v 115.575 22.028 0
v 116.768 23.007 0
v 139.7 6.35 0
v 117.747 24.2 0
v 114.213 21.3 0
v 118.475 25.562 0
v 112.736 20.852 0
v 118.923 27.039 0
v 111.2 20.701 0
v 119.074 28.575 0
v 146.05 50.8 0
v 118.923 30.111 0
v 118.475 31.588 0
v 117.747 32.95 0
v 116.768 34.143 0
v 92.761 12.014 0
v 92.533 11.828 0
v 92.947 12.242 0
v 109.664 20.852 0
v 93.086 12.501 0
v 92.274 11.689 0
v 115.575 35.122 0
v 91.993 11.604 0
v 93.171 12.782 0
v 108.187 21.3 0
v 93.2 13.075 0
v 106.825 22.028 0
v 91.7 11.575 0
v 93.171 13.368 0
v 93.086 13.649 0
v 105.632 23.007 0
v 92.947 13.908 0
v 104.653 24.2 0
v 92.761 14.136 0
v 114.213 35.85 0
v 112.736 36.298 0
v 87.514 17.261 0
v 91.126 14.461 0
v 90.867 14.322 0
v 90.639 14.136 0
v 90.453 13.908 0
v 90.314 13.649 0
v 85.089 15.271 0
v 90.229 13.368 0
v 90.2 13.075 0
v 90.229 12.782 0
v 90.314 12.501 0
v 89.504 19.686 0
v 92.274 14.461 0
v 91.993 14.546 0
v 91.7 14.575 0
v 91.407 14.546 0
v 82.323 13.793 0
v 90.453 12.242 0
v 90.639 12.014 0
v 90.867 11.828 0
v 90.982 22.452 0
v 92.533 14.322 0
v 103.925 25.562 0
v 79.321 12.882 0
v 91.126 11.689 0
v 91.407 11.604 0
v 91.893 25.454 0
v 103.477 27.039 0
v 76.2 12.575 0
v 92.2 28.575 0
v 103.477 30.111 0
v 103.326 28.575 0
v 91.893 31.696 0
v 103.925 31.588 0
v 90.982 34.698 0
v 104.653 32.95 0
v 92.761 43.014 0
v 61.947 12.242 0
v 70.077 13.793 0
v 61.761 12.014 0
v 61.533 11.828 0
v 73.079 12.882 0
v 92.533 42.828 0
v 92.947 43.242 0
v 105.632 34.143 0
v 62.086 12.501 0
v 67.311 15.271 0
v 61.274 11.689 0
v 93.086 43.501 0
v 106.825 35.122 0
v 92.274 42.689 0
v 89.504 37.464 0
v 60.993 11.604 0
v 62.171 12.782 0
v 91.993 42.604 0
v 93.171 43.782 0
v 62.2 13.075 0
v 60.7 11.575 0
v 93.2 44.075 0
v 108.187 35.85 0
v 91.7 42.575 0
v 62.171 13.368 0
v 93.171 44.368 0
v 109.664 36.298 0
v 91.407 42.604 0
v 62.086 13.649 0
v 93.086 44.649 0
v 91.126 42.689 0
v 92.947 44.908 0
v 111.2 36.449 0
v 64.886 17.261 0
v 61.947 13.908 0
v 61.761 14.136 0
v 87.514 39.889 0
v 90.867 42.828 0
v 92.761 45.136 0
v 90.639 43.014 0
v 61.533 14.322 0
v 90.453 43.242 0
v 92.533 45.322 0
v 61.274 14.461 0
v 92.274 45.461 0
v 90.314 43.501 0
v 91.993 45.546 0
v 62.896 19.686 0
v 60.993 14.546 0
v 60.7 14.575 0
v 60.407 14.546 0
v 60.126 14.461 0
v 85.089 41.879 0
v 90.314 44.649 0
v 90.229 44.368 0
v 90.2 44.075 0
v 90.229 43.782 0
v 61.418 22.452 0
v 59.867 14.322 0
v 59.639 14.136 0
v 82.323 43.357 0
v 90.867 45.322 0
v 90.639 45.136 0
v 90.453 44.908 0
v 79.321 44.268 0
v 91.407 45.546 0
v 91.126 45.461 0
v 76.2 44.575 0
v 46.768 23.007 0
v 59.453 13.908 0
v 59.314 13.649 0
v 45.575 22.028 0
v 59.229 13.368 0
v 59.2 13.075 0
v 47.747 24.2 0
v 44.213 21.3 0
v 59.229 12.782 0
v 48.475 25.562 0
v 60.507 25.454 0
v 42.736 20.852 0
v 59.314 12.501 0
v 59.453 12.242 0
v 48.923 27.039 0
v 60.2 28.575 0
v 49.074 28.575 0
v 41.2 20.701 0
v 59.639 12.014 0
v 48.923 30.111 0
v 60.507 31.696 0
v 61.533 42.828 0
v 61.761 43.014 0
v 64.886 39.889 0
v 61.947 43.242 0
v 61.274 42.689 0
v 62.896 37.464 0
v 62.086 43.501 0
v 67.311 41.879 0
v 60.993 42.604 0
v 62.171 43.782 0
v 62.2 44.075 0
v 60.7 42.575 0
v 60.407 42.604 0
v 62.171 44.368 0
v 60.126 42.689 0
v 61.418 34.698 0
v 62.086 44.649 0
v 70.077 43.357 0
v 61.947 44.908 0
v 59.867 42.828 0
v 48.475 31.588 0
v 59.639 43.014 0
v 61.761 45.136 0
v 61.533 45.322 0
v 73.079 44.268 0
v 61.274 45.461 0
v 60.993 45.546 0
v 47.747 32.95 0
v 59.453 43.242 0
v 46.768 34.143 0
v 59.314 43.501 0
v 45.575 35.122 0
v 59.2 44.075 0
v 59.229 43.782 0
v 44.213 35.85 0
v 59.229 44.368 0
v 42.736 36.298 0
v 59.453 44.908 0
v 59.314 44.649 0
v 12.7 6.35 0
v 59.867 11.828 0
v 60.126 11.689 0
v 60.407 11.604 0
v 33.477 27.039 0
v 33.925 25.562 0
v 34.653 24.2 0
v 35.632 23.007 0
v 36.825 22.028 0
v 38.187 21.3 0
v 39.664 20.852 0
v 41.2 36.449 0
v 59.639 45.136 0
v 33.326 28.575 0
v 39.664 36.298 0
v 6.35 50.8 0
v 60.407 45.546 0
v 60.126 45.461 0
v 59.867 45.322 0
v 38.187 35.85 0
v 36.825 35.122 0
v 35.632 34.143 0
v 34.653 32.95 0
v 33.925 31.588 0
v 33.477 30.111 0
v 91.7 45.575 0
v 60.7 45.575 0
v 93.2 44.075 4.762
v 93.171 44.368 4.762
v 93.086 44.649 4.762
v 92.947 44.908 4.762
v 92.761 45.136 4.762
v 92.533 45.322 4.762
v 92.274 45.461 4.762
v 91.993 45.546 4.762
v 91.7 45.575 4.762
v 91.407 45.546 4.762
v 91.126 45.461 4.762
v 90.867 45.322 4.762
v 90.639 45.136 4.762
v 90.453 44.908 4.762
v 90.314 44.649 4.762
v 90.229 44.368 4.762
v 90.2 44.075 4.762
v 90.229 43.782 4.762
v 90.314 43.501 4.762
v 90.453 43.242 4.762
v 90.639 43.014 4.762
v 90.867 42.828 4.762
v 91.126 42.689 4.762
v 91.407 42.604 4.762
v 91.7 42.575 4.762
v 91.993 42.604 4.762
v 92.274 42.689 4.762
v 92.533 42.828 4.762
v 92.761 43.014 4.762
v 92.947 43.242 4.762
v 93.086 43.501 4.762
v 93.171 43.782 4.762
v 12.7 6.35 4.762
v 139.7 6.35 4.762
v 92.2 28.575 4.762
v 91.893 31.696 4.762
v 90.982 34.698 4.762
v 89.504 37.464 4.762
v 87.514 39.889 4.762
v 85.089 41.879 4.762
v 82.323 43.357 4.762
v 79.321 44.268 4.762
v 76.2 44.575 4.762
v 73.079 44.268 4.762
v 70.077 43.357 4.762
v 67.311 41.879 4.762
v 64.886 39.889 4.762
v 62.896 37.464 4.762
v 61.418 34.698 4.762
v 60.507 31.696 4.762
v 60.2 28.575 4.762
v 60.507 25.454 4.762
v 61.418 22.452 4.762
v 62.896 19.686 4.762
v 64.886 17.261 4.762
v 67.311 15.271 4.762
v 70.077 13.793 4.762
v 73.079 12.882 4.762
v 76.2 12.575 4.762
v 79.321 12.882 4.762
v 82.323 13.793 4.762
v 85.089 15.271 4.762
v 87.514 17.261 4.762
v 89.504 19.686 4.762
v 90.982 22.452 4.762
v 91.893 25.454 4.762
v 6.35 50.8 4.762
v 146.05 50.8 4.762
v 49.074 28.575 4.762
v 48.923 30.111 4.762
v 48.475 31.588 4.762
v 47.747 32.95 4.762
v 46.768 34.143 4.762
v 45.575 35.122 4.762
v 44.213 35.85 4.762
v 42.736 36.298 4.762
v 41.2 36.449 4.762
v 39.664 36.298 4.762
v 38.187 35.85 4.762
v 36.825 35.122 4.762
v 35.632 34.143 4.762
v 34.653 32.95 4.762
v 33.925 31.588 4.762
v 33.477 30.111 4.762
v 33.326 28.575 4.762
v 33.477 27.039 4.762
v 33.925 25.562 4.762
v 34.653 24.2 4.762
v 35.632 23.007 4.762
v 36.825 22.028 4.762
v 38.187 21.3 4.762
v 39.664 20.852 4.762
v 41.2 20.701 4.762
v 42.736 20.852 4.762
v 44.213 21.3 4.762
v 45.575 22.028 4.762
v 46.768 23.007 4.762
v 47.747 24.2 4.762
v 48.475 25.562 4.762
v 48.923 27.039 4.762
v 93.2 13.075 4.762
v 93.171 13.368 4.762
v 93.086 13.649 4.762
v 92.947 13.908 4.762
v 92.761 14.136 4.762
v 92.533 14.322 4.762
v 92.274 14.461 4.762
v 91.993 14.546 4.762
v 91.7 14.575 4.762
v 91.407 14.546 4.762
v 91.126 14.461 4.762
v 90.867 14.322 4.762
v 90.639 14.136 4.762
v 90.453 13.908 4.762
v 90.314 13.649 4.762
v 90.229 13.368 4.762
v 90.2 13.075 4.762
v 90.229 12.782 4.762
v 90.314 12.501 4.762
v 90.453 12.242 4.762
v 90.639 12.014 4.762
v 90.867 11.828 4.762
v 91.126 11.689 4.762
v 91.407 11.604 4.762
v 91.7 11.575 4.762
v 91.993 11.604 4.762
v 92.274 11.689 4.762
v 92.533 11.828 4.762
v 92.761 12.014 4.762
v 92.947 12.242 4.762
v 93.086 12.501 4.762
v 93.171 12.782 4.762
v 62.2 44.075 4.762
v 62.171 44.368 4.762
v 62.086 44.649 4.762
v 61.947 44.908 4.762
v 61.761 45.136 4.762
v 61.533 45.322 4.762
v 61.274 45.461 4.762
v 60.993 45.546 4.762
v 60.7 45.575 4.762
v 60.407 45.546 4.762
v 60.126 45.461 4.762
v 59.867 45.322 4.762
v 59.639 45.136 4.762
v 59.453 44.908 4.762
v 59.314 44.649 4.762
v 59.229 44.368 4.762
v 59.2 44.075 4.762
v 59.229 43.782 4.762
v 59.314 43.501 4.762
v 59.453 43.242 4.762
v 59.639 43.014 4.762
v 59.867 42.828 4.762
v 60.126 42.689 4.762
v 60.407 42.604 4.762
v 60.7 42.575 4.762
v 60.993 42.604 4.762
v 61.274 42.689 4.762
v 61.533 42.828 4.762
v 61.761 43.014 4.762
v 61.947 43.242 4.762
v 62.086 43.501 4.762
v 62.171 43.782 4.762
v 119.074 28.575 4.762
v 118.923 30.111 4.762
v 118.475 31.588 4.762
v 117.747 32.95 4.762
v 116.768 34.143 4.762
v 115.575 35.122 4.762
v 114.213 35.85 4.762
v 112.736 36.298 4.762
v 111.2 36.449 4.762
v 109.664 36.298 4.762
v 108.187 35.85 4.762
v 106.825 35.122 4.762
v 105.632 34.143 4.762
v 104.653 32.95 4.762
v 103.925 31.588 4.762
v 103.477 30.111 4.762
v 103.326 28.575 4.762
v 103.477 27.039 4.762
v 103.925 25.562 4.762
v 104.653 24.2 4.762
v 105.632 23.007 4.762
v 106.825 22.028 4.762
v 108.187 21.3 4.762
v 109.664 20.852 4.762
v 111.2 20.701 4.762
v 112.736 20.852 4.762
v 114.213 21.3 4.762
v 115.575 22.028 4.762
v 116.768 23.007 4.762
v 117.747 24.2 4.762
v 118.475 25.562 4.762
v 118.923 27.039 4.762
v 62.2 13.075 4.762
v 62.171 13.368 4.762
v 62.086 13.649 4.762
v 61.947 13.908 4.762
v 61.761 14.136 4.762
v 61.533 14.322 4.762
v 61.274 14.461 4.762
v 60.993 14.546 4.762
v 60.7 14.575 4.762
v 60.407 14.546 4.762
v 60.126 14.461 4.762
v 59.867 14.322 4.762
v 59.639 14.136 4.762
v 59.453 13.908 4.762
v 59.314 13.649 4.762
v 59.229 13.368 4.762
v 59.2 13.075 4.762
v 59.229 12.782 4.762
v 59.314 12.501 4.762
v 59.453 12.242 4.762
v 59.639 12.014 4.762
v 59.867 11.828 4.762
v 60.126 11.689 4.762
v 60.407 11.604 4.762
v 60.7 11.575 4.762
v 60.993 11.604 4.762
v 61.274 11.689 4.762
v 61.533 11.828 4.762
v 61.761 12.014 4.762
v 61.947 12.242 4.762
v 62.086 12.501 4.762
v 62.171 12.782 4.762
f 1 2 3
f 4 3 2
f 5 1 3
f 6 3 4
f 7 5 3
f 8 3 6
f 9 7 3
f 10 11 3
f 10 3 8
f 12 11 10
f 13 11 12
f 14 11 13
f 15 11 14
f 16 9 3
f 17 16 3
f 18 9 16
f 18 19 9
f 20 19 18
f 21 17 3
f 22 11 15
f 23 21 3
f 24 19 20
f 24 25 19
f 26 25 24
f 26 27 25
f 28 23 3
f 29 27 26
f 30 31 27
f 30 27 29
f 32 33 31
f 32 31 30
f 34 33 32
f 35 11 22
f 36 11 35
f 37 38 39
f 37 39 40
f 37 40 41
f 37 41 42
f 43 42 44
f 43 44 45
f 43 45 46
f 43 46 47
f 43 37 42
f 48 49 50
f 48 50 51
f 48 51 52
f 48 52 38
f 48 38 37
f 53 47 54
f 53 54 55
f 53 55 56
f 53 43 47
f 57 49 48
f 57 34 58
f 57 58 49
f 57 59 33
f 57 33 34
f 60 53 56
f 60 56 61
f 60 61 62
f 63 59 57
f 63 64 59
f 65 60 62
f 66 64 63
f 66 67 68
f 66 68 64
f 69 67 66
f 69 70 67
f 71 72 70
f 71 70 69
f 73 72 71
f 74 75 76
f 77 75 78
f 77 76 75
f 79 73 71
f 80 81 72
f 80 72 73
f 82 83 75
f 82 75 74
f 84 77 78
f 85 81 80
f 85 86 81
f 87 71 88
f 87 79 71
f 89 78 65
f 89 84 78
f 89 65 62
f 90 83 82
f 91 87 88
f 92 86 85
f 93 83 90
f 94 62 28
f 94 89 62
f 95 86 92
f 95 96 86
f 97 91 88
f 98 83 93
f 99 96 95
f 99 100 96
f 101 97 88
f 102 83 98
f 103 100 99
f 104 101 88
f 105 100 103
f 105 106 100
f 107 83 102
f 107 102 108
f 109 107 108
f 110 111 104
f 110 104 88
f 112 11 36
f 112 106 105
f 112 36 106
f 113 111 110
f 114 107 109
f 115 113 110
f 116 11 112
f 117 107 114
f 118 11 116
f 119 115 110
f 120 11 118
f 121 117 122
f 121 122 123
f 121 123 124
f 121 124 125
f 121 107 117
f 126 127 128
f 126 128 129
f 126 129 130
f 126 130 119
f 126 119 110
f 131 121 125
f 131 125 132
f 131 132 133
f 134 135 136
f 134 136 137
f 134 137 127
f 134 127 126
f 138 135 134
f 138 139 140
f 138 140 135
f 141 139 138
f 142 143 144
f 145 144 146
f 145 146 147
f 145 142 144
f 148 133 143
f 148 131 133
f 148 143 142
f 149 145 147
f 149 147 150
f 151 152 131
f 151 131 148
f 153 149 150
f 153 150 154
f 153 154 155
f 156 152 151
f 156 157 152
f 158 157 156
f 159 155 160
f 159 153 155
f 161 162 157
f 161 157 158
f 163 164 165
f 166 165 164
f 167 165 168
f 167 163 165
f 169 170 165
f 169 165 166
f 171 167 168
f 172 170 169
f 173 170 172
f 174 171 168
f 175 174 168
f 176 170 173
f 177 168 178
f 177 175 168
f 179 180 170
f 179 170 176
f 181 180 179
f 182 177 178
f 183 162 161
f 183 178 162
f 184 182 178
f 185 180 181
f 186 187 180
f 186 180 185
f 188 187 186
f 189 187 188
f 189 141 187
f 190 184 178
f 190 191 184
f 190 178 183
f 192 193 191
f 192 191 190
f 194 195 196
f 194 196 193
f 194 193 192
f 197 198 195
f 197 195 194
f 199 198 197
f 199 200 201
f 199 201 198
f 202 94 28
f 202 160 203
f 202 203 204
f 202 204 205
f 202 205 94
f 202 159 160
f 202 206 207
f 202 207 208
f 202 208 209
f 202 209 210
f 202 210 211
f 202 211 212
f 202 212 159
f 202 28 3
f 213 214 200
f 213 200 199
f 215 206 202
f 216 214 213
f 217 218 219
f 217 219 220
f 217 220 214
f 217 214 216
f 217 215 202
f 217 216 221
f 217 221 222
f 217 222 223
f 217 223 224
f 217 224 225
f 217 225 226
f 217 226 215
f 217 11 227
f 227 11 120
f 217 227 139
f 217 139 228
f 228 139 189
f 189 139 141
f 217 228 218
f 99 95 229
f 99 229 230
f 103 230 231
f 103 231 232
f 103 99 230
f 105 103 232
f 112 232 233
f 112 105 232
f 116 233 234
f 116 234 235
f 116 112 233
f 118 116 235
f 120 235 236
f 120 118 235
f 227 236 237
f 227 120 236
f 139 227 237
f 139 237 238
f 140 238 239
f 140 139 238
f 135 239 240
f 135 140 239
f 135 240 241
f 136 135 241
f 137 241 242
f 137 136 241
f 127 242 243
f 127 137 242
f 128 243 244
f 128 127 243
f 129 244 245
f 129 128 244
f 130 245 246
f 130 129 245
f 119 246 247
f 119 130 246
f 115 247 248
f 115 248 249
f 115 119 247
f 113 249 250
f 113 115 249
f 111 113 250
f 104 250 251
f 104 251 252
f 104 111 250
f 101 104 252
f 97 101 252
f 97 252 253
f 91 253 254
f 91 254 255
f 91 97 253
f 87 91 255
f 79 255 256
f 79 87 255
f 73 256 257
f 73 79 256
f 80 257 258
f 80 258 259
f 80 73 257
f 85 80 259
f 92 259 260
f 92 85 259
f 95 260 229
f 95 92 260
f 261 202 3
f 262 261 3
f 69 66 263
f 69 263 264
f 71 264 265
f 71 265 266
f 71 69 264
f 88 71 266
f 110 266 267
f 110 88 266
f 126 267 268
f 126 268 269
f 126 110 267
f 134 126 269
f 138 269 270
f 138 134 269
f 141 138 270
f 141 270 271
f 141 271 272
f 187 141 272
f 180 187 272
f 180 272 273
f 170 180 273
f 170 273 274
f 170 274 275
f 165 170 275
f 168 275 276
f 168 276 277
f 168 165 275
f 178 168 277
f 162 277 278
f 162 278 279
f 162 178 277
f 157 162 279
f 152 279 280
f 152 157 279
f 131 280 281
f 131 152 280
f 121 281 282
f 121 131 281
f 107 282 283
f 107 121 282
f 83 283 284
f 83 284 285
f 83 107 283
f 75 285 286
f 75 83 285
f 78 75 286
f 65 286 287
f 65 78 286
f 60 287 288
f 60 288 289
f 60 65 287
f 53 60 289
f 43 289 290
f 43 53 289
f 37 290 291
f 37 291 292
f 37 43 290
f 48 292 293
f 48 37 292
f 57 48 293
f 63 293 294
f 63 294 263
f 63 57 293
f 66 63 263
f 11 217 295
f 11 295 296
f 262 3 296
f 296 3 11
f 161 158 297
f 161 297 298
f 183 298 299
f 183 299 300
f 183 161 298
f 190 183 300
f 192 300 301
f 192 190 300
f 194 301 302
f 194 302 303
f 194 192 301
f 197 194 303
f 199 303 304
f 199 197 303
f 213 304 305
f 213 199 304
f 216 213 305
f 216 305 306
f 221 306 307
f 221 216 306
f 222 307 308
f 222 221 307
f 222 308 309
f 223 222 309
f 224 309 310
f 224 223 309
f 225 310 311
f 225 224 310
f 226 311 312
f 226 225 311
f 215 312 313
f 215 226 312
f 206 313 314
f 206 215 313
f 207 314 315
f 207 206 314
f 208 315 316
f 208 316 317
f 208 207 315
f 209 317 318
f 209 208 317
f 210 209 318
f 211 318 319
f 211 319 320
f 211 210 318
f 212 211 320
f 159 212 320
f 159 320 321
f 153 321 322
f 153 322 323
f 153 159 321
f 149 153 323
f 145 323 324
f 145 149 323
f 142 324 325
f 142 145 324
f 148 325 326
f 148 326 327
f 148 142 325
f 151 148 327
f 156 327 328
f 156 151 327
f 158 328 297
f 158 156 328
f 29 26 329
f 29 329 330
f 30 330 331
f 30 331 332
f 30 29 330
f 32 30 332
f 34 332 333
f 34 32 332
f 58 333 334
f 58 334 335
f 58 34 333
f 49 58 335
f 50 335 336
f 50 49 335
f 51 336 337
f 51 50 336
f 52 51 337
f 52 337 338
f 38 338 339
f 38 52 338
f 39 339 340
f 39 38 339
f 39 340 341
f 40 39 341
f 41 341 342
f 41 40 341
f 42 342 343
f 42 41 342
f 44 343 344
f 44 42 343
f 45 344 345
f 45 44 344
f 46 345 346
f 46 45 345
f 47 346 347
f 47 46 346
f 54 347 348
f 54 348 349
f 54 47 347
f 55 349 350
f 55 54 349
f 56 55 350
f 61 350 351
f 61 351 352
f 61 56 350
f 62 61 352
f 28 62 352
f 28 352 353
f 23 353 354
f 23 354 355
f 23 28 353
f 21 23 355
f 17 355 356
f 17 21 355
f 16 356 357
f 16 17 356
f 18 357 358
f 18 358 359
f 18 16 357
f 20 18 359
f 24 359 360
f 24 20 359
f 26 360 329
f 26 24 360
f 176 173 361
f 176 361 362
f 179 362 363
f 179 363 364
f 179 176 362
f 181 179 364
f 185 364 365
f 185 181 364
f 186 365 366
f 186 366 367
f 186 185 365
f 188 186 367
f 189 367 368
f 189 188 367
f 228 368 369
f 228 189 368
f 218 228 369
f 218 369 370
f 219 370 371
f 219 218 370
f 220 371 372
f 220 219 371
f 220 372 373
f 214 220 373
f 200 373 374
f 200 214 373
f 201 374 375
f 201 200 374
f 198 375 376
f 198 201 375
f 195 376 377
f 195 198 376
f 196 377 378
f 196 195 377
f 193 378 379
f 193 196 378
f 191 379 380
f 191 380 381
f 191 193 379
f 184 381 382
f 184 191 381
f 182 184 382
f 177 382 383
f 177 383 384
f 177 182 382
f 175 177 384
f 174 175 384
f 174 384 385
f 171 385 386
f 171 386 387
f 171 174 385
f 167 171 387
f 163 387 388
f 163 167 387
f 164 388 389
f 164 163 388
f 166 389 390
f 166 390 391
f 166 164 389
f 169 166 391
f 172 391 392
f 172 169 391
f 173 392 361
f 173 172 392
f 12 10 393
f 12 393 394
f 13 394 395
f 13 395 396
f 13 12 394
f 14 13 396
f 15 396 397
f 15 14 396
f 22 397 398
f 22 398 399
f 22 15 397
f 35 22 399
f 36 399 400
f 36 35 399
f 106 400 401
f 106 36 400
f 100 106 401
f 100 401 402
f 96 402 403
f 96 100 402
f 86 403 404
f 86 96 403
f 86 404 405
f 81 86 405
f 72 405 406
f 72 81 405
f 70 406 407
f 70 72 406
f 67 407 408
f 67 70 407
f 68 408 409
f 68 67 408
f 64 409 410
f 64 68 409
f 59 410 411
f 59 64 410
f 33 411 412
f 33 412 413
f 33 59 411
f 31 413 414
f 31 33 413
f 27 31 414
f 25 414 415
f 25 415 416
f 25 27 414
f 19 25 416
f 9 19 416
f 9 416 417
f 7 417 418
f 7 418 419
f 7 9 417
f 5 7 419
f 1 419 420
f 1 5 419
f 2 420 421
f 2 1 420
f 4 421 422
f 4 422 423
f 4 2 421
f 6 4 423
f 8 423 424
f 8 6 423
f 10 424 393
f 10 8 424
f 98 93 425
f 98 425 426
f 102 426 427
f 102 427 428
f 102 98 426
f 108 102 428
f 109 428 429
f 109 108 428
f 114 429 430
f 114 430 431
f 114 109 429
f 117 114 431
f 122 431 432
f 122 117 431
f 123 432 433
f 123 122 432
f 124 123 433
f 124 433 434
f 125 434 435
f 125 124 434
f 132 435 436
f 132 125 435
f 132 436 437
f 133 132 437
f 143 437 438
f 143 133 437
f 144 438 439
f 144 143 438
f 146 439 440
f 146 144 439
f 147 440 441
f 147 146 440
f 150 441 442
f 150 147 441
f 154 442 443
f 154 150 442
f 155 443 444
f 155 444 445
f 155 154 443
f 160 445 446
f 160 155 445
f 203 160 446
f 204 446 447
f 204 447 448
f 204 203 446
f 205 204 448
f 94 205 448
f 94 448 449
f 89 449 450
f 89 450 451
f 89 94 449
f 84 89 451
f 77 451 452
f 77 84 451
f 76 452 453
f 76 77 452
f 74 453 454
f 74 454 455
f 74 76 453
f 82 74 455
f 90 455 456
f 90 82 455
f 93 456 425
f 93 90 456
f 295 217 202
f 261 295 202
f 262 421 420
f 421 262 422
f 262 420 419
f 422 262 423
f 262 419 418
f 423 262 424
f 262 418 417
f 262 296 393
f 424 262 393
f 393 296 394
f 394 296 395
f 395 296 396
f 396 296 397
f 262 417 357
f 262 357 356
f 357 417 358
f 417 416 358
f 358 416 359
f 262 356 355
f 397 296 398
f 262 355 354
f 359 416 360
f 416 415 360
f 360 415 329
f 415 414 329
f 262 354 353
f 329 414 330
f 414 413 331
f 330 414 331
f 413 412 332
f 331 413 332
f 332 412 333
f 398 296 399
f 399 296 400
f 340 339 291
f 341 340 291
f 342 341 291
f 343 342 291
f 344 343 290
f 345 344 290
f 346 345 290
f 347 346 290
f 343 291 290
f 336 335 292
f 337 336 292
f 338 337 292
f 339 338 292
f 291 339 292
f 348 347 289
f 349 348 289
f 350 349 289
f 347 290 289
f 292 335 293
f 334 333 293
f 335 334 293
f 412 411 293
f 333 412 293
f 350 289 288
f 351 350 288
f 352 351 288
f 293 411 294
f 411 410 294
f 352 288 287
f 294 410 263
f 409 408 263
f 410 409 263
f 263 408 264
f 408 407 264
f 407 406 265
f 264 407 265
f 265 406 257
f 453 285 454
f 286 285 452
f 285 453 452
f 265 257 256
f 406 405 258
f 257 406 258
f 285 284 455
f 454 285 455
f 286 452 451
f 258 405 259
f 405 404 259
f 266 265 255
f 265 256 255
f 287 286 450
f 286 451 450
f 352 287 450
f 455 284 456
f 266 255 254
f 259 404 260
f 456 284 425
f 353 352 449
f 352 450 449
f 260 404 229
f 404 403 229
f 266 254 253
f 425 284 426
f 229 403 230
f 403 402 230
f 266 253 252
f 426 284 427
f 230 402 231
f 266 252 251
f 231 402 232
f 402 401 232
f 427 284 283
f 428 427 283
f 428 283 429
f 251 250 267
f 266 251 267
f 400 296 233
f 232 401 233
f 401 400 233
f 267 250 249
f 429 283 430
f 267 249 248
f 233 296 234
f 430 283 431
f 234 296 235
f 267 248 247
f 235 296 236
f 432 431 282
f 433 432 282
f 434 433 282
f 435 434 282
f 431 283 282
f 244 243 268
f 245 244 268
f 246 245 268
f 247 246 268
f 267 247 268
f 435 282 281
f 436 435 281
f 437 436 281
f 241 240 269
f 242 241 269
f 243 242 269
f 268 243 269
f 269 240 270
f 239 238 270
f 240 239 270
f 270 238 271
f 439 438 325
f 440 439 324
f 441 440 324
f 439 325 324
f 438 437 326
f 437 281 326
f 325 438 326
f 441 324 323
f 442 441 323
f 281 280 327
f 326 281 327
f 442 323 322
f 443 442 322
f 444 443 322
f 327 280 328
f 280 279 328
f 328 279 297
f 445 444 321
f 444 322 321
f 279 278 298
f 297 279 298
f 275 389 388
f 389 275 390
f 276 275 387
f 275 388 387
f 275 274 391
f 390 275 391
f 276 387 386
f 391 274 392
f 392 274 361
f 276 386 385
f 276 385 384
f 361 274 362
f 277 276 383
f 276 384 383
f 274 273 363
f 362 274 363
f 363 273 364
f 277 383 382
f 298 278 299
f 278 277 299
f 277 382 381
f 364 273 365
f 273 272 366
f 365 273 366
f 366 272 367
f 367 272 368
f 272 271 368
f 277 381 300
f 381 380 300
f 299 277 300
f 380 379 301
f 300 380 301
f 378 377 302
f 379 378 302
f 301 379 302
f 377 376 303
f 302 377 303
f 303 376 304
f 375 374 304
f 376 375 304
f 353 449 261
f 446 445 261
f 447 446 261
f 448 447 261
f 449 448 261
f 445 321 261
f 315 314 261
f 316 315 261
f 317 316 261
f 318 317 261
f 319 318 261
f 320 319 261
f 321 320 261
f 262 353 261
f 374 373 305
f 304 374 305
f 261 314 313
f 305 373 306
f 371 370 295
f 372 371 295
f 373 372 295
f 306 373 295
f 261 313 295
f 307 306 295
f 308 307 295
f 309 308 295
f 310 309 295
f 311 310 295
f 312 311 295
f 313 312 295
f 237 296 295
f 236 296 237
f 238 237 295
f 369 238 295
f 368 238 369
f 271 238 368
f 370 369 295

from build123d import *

# Parameters (mm, degrees)
BOSS_EXTRUDE1_DEPTH = 4.7625
SKETCH2_3_R         = 1.5
SKETCH2_3_R_2       = 7.874
SKETCH2_3_R_3       = 16
BOSS_EXTRUDE2_DEPTH = 4.7625
CUT_EXTRUDE1_DEPTH  = 4.7625


with BuildPart() as part:
    # Sketch2 → Boss-Extrude1 (new body)
    with BuildSketch(Plane.XY):
        Polygon((139.7, 6.35), (146.05, 50.8), (152.4, 50.8), (152.4, 0), (0, 0), (0, 50.8), (6.35, 50.8), (12.7, 6.35), align=None)
    extrude(amount=BOSS_EXTRUDE1_DEPTH)

    # Sketch2<3> → Boss-Extrude2 (add)
    # profile 1 of 2: a face of its own
    with BuildSketch(Plane.XY):
        Polygon((0, 50.8), (0, 0), (152.4, 0), (152.4, 50.8), (146.05, 50.8), (139.7, 6.35), (12.7, 6.35), (6.35, 50.8), align=None)
    # profile 2 of 2: a face of its own
    with BuildSketch(Plane.XY):
        Polygon((146.05, 50.8), (6.35, 50.8), (12.7, 6.35), (139.7, 6.35), align=None)
        with Locations((60.7, 13.075)):
            Circle(SKETCH2_3_R, mode=Mode.SUBTRACT)
        with Locations((91.7, 13.075)):
            Circle(SKETCH2_3_R, mode=Mode.SUBTRACT)
        with Locations((41.2, 28.575)):
            Circle(SKETCH2_3_R_2, mode=Mode.SUBTRACT)
        with Locations((60.7, 44.075)):
            Circle(SKETCH2_3_R, mode=Mode.SUBTRACT)
        with Locations((76.2, 28.575)):
            Circle(SKETCH2_3_R_3, mode=Mode.SUBTRACT)
        with Locations((111.2, 28.575)):
            Circle(SKETCH2_3_R_2, mode=Mode.SUBTRACT)
        with Locations((91.7, 44.075)):
            Circle(SKETCH2_3_R, mode=Mode.SUBTRACT)
    extrude(amount=BOSS_EXTRUDE2_DEPTH)

    # Sketch2<4> → Cut-Extrude1 (cut)
    with BuildSketch(Plane.XY):
        Polygon((139.7, 6.35), (146.05, 50.8), (152.4, 50.8), (152.4, 0), (0, 0), (0, 50.8), (6.35, 50.8), (12.7, 6.35), align=None)
    extrude(amount=CUT_EXTRUDE1_DEPTH, mode=Mode.SUBTRACT)


solid = part.part
